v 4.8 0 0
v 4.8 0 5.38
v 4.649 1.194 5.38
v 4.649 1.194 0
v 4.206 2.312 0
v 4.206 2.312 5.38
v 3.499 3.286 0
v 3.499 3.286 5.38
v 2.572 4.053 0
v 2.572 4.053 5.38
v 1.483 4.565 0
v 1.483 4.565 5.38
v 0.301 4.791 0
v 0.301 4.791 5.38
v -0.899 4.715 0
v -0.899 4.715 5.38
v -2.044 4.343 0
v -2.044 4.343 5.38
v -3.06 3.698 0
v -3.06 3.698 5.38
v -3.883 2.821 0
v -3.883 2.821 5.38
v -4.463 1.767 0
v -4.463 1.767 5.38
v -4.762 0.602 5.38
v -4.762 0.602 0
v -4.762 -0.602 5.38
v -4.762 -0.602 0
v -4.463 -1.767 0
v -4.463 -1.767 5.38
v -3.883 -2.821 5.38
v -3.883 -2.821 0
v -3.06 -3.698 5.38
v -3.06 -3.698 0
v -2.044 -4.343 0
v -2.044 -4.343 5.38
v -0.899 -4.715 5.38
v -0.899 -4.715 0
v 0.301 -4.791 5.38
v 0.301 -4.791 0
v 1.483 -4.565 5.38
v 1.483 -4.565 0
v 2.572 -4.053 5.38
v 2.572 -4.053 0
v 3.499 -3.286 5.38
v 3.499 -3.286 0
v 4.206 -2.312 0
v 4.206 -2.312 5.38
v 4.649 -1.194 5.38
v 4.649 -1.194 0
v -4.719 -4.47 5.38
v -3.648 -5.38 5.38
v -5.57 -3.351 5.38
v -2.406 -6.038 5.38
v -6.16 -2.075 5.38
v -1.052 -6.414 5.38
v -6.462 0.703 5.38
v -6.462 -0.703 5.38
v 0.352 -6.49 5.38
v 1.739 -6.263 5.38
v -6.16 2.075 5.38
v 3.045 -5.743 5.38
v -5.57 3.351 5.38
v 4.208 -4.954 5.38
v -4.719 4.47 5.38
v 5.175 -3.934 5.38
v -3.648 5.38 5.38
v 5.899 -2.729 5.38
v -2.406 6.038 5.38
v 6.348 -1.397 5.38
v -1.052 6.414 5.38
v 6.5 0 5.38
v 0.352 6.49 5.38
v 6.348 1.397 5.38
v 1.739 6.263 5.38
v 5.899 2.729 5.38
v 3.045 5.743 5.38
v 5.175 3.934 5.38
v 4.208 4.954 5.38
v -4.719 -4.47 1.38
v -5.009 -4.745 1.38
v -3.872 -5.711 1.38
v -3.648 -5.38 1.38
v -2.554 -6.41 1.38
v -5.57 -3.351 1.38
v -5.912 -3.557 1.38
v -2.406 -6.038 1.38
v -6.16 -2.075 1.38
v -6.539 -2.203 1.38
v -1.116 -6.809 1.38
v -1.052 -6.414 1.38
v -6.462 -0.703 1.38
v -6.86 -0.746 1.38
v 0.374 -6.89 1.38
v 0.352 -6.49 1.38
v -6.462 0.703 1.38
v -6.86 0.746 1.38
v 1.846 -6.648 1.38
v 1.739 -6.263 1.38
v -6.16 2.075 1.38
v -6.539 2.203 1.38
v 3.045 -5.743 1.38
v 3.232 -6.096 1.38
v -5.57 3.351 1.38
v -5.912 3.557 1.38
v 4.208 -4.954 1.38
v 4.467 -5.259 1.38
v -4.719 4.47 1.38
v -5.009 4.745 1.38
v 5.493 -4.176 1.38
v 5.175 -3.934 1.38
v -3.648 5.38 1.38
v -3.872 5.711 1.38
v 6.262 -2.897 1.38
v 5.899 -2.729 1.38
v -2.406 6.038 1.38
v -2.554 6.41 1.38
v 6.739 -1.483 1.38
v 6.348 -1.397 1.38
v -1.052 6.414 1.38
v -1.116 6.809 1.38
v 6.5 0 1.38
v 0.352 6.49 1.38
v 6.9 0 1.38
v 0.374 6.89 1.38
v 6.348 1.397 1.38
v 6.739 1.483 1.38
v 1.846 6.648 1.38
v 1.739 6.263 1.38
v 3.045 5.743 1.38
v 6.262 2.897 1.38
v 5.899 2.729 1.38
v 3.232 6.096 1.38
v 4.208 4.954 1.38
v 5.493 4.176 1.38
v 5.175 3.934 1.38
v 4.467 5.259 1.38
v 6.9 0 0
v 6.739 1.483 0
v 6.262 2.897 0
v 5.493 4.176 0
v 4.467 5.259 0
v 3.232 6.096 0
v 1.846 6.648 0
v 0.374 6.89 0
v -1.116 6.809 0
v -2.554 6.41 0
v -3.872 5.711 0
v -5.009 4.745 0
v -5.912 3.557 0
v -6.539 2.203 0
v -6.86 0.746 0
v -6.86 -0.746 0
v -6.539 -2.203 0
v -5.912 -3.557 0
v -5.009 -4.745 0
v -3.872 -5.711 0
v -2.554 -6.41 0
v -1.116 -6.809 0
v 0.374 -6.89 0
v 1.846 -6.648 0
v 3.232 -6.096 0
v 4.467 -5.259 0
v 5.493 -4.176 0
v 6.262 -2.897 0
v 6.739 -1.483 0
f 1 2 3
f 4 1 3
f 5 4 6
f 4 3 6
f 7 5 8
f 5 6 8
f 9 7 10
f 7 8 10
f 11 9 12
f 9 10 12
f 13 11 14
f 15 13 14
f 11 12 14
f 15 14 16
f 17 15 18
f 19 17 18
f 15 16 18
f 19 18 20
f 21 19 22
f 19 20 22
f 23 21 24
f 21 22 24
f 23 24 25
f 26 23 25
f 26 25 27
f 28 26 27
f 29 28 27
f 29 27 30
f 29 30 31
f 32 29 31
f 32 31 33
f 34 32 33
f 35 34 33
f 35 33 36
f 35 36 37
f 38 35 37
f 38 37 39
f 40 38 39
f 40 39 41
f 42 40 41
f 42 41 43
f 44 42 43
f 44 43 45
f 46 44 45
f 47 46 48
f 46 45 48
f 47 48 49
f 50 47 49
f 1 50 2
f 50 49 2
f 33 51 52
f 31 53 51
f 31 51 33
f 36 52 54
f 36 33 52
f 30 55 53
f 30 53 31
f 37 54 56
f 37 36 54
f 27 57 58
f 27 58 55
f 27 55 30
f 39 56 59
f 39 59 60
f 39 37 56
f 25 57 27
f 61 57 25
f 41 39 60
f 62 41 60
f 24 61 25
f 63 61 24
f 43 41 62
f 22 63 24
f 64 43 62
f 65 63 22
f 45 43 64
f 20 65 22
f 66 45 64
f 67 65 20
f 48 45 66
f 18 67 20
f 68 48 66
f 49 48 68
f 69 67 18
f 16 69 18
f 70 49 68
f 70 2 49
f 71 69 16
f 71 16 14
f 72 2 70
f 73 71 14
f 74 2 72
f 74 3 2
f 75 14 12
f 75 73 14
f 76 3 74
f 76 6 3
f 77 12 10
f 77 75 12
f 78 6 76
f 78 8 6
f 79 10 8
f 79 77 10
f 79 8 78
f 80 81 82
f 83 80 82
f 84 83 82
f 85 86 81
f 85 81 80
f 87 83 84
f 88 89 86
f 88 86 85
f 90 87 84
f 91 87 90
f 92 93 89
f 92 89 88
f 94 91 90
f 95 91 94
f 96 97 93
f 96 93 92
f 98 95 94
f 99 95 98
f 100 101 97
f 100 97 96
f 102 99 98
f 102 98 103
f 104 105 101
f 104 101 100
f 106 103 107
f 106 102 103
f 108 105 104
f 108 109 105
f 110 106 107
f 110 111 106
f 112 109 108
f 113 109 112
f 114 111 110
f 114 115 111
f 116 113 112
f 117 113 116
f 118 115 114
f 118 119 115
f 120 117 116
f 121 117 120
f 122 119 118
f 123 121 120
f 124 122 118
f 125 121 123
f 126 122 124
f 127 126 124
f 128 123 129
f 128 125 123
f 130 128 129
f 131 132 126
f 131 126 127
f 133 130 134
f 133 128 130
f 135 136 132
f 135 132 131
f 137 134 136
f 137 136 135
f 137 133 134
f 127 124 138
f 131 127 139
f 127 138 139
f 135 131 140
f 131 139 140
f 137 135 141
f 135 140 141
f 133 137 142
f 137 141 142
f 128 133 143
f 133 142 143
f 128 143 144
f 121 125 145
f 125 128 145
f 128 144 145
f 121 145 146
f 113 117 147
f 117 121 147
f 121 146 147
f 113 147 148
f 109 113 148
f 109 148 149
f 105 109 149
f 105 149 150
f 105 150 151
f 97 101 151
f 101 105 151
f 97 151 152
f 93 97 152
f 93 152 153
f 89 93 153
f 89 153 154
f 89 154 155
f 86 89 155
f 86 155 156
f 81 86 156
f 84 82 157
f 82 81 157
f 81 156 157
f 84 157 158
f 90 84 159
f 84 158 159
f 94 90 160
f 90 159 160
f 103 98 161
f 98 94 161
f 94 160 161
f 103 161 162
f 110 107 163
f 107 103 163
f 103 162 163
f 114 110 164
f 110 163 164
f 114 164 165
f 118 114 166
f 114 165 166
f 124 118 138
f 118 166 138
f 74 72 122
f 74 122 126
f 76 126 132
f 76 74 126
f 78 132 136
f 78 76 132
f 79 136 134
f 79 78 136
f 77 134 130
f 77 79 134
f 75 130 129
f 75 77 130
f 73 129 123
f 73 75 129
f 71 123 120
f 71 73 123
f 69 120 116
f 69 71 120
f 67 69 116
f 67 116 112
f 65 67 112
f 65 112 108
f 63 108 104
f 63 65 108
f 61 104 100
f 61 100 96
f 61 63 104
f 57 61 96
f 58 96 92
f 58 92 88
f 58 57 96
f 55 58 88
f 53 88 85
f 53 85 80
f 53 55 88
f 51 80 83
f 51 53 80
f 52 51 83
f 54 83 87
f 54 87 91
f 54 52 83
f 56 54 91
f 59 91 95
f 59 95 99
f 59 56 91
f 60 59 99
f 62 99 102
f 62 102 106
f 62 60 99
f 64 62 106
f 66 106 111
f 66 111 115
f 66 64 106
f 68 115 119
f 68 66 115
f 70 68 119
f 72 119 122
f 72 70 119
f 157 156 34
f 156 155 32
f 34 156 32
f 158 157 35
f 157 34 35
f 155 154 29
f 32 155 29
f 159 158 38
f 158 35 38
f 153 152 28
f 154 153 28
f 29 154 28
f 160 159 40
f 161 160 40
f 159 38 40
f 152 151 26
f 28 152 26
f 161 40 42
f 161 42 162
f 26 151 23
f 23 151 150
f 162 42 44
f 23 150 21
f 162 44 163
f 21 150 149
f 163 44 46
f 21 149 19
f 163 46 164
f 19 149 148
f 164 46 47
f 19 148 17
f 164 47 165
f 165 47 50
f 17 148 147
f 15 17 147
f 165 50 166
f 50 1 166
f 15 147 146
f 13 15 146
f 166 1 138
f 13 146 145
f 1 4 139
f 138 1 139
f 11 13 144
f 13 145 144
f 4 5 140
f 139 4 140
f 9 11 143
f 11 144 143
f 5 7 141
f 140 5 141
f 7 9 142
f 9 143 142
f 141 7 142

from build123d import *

# Parameters (mm, degrees)
CROQUIS1_R              = 6.9
SALIENTE_EXTRUIR3_DEPTH = 5.38
CROQUIS4_OUTSIDE_W      = 19.848
CROQUIS4_OUTSIDE_H      = 19.848
CROQUIS4_OUTSIDE_R      = 6.5
CORTAR_EXTRUIR2_DEPTH   = 4
CORTAR_EXTRUIR3_REACH   = 13.143
CROQUIS5_R              = 4.8


with BuildPart() as part:
    # Croquis1 → Saliente-Extruir3 (new body)
    with BuildSketch(Plane.XY):
        Circle(CROQUIS1_R)
    extrude(amount=SALIENTE_EXTRUIR3_DEPTH)

    # Croquis4 outside → Cortar-Extruir2 (cut)
    with BuildSketch(Plane.XY.offset(5.38)):
        Rectangle(CROQUIS4_OUTSIDE_W, CROQUIS4_OUTSIDE_H)
        Circle(CROQUIS4_OUTSIDE_R, mode=Mode.SUBTRACT)
    extrude(amount=-CORTAR_EXTRUIR2_DEPTH, mode=Mode.SUBTRACT)

    # Croquis5 → Cortar-Extruir3 (cut, up to next)
    with BuildSketch(Plane.XY.offset(5.38), mode=Mode.PRIVATE) as cortar_extruir3_sk1:
        Circle(CROQUIS5_R)
    cortar_extruir3_tool1 = extrude(cortar_extruir3_sk1.sketch, amount=-CORTAR_EXTRUIR3_REACH, mode=Mode.PRIVATE) & part.part
    add(cortar_extruir3_tool1.solids().sort_by_distance((0, 0, 5.38))[0], mode=Mode.SUBTRACT)


solid = part.part
